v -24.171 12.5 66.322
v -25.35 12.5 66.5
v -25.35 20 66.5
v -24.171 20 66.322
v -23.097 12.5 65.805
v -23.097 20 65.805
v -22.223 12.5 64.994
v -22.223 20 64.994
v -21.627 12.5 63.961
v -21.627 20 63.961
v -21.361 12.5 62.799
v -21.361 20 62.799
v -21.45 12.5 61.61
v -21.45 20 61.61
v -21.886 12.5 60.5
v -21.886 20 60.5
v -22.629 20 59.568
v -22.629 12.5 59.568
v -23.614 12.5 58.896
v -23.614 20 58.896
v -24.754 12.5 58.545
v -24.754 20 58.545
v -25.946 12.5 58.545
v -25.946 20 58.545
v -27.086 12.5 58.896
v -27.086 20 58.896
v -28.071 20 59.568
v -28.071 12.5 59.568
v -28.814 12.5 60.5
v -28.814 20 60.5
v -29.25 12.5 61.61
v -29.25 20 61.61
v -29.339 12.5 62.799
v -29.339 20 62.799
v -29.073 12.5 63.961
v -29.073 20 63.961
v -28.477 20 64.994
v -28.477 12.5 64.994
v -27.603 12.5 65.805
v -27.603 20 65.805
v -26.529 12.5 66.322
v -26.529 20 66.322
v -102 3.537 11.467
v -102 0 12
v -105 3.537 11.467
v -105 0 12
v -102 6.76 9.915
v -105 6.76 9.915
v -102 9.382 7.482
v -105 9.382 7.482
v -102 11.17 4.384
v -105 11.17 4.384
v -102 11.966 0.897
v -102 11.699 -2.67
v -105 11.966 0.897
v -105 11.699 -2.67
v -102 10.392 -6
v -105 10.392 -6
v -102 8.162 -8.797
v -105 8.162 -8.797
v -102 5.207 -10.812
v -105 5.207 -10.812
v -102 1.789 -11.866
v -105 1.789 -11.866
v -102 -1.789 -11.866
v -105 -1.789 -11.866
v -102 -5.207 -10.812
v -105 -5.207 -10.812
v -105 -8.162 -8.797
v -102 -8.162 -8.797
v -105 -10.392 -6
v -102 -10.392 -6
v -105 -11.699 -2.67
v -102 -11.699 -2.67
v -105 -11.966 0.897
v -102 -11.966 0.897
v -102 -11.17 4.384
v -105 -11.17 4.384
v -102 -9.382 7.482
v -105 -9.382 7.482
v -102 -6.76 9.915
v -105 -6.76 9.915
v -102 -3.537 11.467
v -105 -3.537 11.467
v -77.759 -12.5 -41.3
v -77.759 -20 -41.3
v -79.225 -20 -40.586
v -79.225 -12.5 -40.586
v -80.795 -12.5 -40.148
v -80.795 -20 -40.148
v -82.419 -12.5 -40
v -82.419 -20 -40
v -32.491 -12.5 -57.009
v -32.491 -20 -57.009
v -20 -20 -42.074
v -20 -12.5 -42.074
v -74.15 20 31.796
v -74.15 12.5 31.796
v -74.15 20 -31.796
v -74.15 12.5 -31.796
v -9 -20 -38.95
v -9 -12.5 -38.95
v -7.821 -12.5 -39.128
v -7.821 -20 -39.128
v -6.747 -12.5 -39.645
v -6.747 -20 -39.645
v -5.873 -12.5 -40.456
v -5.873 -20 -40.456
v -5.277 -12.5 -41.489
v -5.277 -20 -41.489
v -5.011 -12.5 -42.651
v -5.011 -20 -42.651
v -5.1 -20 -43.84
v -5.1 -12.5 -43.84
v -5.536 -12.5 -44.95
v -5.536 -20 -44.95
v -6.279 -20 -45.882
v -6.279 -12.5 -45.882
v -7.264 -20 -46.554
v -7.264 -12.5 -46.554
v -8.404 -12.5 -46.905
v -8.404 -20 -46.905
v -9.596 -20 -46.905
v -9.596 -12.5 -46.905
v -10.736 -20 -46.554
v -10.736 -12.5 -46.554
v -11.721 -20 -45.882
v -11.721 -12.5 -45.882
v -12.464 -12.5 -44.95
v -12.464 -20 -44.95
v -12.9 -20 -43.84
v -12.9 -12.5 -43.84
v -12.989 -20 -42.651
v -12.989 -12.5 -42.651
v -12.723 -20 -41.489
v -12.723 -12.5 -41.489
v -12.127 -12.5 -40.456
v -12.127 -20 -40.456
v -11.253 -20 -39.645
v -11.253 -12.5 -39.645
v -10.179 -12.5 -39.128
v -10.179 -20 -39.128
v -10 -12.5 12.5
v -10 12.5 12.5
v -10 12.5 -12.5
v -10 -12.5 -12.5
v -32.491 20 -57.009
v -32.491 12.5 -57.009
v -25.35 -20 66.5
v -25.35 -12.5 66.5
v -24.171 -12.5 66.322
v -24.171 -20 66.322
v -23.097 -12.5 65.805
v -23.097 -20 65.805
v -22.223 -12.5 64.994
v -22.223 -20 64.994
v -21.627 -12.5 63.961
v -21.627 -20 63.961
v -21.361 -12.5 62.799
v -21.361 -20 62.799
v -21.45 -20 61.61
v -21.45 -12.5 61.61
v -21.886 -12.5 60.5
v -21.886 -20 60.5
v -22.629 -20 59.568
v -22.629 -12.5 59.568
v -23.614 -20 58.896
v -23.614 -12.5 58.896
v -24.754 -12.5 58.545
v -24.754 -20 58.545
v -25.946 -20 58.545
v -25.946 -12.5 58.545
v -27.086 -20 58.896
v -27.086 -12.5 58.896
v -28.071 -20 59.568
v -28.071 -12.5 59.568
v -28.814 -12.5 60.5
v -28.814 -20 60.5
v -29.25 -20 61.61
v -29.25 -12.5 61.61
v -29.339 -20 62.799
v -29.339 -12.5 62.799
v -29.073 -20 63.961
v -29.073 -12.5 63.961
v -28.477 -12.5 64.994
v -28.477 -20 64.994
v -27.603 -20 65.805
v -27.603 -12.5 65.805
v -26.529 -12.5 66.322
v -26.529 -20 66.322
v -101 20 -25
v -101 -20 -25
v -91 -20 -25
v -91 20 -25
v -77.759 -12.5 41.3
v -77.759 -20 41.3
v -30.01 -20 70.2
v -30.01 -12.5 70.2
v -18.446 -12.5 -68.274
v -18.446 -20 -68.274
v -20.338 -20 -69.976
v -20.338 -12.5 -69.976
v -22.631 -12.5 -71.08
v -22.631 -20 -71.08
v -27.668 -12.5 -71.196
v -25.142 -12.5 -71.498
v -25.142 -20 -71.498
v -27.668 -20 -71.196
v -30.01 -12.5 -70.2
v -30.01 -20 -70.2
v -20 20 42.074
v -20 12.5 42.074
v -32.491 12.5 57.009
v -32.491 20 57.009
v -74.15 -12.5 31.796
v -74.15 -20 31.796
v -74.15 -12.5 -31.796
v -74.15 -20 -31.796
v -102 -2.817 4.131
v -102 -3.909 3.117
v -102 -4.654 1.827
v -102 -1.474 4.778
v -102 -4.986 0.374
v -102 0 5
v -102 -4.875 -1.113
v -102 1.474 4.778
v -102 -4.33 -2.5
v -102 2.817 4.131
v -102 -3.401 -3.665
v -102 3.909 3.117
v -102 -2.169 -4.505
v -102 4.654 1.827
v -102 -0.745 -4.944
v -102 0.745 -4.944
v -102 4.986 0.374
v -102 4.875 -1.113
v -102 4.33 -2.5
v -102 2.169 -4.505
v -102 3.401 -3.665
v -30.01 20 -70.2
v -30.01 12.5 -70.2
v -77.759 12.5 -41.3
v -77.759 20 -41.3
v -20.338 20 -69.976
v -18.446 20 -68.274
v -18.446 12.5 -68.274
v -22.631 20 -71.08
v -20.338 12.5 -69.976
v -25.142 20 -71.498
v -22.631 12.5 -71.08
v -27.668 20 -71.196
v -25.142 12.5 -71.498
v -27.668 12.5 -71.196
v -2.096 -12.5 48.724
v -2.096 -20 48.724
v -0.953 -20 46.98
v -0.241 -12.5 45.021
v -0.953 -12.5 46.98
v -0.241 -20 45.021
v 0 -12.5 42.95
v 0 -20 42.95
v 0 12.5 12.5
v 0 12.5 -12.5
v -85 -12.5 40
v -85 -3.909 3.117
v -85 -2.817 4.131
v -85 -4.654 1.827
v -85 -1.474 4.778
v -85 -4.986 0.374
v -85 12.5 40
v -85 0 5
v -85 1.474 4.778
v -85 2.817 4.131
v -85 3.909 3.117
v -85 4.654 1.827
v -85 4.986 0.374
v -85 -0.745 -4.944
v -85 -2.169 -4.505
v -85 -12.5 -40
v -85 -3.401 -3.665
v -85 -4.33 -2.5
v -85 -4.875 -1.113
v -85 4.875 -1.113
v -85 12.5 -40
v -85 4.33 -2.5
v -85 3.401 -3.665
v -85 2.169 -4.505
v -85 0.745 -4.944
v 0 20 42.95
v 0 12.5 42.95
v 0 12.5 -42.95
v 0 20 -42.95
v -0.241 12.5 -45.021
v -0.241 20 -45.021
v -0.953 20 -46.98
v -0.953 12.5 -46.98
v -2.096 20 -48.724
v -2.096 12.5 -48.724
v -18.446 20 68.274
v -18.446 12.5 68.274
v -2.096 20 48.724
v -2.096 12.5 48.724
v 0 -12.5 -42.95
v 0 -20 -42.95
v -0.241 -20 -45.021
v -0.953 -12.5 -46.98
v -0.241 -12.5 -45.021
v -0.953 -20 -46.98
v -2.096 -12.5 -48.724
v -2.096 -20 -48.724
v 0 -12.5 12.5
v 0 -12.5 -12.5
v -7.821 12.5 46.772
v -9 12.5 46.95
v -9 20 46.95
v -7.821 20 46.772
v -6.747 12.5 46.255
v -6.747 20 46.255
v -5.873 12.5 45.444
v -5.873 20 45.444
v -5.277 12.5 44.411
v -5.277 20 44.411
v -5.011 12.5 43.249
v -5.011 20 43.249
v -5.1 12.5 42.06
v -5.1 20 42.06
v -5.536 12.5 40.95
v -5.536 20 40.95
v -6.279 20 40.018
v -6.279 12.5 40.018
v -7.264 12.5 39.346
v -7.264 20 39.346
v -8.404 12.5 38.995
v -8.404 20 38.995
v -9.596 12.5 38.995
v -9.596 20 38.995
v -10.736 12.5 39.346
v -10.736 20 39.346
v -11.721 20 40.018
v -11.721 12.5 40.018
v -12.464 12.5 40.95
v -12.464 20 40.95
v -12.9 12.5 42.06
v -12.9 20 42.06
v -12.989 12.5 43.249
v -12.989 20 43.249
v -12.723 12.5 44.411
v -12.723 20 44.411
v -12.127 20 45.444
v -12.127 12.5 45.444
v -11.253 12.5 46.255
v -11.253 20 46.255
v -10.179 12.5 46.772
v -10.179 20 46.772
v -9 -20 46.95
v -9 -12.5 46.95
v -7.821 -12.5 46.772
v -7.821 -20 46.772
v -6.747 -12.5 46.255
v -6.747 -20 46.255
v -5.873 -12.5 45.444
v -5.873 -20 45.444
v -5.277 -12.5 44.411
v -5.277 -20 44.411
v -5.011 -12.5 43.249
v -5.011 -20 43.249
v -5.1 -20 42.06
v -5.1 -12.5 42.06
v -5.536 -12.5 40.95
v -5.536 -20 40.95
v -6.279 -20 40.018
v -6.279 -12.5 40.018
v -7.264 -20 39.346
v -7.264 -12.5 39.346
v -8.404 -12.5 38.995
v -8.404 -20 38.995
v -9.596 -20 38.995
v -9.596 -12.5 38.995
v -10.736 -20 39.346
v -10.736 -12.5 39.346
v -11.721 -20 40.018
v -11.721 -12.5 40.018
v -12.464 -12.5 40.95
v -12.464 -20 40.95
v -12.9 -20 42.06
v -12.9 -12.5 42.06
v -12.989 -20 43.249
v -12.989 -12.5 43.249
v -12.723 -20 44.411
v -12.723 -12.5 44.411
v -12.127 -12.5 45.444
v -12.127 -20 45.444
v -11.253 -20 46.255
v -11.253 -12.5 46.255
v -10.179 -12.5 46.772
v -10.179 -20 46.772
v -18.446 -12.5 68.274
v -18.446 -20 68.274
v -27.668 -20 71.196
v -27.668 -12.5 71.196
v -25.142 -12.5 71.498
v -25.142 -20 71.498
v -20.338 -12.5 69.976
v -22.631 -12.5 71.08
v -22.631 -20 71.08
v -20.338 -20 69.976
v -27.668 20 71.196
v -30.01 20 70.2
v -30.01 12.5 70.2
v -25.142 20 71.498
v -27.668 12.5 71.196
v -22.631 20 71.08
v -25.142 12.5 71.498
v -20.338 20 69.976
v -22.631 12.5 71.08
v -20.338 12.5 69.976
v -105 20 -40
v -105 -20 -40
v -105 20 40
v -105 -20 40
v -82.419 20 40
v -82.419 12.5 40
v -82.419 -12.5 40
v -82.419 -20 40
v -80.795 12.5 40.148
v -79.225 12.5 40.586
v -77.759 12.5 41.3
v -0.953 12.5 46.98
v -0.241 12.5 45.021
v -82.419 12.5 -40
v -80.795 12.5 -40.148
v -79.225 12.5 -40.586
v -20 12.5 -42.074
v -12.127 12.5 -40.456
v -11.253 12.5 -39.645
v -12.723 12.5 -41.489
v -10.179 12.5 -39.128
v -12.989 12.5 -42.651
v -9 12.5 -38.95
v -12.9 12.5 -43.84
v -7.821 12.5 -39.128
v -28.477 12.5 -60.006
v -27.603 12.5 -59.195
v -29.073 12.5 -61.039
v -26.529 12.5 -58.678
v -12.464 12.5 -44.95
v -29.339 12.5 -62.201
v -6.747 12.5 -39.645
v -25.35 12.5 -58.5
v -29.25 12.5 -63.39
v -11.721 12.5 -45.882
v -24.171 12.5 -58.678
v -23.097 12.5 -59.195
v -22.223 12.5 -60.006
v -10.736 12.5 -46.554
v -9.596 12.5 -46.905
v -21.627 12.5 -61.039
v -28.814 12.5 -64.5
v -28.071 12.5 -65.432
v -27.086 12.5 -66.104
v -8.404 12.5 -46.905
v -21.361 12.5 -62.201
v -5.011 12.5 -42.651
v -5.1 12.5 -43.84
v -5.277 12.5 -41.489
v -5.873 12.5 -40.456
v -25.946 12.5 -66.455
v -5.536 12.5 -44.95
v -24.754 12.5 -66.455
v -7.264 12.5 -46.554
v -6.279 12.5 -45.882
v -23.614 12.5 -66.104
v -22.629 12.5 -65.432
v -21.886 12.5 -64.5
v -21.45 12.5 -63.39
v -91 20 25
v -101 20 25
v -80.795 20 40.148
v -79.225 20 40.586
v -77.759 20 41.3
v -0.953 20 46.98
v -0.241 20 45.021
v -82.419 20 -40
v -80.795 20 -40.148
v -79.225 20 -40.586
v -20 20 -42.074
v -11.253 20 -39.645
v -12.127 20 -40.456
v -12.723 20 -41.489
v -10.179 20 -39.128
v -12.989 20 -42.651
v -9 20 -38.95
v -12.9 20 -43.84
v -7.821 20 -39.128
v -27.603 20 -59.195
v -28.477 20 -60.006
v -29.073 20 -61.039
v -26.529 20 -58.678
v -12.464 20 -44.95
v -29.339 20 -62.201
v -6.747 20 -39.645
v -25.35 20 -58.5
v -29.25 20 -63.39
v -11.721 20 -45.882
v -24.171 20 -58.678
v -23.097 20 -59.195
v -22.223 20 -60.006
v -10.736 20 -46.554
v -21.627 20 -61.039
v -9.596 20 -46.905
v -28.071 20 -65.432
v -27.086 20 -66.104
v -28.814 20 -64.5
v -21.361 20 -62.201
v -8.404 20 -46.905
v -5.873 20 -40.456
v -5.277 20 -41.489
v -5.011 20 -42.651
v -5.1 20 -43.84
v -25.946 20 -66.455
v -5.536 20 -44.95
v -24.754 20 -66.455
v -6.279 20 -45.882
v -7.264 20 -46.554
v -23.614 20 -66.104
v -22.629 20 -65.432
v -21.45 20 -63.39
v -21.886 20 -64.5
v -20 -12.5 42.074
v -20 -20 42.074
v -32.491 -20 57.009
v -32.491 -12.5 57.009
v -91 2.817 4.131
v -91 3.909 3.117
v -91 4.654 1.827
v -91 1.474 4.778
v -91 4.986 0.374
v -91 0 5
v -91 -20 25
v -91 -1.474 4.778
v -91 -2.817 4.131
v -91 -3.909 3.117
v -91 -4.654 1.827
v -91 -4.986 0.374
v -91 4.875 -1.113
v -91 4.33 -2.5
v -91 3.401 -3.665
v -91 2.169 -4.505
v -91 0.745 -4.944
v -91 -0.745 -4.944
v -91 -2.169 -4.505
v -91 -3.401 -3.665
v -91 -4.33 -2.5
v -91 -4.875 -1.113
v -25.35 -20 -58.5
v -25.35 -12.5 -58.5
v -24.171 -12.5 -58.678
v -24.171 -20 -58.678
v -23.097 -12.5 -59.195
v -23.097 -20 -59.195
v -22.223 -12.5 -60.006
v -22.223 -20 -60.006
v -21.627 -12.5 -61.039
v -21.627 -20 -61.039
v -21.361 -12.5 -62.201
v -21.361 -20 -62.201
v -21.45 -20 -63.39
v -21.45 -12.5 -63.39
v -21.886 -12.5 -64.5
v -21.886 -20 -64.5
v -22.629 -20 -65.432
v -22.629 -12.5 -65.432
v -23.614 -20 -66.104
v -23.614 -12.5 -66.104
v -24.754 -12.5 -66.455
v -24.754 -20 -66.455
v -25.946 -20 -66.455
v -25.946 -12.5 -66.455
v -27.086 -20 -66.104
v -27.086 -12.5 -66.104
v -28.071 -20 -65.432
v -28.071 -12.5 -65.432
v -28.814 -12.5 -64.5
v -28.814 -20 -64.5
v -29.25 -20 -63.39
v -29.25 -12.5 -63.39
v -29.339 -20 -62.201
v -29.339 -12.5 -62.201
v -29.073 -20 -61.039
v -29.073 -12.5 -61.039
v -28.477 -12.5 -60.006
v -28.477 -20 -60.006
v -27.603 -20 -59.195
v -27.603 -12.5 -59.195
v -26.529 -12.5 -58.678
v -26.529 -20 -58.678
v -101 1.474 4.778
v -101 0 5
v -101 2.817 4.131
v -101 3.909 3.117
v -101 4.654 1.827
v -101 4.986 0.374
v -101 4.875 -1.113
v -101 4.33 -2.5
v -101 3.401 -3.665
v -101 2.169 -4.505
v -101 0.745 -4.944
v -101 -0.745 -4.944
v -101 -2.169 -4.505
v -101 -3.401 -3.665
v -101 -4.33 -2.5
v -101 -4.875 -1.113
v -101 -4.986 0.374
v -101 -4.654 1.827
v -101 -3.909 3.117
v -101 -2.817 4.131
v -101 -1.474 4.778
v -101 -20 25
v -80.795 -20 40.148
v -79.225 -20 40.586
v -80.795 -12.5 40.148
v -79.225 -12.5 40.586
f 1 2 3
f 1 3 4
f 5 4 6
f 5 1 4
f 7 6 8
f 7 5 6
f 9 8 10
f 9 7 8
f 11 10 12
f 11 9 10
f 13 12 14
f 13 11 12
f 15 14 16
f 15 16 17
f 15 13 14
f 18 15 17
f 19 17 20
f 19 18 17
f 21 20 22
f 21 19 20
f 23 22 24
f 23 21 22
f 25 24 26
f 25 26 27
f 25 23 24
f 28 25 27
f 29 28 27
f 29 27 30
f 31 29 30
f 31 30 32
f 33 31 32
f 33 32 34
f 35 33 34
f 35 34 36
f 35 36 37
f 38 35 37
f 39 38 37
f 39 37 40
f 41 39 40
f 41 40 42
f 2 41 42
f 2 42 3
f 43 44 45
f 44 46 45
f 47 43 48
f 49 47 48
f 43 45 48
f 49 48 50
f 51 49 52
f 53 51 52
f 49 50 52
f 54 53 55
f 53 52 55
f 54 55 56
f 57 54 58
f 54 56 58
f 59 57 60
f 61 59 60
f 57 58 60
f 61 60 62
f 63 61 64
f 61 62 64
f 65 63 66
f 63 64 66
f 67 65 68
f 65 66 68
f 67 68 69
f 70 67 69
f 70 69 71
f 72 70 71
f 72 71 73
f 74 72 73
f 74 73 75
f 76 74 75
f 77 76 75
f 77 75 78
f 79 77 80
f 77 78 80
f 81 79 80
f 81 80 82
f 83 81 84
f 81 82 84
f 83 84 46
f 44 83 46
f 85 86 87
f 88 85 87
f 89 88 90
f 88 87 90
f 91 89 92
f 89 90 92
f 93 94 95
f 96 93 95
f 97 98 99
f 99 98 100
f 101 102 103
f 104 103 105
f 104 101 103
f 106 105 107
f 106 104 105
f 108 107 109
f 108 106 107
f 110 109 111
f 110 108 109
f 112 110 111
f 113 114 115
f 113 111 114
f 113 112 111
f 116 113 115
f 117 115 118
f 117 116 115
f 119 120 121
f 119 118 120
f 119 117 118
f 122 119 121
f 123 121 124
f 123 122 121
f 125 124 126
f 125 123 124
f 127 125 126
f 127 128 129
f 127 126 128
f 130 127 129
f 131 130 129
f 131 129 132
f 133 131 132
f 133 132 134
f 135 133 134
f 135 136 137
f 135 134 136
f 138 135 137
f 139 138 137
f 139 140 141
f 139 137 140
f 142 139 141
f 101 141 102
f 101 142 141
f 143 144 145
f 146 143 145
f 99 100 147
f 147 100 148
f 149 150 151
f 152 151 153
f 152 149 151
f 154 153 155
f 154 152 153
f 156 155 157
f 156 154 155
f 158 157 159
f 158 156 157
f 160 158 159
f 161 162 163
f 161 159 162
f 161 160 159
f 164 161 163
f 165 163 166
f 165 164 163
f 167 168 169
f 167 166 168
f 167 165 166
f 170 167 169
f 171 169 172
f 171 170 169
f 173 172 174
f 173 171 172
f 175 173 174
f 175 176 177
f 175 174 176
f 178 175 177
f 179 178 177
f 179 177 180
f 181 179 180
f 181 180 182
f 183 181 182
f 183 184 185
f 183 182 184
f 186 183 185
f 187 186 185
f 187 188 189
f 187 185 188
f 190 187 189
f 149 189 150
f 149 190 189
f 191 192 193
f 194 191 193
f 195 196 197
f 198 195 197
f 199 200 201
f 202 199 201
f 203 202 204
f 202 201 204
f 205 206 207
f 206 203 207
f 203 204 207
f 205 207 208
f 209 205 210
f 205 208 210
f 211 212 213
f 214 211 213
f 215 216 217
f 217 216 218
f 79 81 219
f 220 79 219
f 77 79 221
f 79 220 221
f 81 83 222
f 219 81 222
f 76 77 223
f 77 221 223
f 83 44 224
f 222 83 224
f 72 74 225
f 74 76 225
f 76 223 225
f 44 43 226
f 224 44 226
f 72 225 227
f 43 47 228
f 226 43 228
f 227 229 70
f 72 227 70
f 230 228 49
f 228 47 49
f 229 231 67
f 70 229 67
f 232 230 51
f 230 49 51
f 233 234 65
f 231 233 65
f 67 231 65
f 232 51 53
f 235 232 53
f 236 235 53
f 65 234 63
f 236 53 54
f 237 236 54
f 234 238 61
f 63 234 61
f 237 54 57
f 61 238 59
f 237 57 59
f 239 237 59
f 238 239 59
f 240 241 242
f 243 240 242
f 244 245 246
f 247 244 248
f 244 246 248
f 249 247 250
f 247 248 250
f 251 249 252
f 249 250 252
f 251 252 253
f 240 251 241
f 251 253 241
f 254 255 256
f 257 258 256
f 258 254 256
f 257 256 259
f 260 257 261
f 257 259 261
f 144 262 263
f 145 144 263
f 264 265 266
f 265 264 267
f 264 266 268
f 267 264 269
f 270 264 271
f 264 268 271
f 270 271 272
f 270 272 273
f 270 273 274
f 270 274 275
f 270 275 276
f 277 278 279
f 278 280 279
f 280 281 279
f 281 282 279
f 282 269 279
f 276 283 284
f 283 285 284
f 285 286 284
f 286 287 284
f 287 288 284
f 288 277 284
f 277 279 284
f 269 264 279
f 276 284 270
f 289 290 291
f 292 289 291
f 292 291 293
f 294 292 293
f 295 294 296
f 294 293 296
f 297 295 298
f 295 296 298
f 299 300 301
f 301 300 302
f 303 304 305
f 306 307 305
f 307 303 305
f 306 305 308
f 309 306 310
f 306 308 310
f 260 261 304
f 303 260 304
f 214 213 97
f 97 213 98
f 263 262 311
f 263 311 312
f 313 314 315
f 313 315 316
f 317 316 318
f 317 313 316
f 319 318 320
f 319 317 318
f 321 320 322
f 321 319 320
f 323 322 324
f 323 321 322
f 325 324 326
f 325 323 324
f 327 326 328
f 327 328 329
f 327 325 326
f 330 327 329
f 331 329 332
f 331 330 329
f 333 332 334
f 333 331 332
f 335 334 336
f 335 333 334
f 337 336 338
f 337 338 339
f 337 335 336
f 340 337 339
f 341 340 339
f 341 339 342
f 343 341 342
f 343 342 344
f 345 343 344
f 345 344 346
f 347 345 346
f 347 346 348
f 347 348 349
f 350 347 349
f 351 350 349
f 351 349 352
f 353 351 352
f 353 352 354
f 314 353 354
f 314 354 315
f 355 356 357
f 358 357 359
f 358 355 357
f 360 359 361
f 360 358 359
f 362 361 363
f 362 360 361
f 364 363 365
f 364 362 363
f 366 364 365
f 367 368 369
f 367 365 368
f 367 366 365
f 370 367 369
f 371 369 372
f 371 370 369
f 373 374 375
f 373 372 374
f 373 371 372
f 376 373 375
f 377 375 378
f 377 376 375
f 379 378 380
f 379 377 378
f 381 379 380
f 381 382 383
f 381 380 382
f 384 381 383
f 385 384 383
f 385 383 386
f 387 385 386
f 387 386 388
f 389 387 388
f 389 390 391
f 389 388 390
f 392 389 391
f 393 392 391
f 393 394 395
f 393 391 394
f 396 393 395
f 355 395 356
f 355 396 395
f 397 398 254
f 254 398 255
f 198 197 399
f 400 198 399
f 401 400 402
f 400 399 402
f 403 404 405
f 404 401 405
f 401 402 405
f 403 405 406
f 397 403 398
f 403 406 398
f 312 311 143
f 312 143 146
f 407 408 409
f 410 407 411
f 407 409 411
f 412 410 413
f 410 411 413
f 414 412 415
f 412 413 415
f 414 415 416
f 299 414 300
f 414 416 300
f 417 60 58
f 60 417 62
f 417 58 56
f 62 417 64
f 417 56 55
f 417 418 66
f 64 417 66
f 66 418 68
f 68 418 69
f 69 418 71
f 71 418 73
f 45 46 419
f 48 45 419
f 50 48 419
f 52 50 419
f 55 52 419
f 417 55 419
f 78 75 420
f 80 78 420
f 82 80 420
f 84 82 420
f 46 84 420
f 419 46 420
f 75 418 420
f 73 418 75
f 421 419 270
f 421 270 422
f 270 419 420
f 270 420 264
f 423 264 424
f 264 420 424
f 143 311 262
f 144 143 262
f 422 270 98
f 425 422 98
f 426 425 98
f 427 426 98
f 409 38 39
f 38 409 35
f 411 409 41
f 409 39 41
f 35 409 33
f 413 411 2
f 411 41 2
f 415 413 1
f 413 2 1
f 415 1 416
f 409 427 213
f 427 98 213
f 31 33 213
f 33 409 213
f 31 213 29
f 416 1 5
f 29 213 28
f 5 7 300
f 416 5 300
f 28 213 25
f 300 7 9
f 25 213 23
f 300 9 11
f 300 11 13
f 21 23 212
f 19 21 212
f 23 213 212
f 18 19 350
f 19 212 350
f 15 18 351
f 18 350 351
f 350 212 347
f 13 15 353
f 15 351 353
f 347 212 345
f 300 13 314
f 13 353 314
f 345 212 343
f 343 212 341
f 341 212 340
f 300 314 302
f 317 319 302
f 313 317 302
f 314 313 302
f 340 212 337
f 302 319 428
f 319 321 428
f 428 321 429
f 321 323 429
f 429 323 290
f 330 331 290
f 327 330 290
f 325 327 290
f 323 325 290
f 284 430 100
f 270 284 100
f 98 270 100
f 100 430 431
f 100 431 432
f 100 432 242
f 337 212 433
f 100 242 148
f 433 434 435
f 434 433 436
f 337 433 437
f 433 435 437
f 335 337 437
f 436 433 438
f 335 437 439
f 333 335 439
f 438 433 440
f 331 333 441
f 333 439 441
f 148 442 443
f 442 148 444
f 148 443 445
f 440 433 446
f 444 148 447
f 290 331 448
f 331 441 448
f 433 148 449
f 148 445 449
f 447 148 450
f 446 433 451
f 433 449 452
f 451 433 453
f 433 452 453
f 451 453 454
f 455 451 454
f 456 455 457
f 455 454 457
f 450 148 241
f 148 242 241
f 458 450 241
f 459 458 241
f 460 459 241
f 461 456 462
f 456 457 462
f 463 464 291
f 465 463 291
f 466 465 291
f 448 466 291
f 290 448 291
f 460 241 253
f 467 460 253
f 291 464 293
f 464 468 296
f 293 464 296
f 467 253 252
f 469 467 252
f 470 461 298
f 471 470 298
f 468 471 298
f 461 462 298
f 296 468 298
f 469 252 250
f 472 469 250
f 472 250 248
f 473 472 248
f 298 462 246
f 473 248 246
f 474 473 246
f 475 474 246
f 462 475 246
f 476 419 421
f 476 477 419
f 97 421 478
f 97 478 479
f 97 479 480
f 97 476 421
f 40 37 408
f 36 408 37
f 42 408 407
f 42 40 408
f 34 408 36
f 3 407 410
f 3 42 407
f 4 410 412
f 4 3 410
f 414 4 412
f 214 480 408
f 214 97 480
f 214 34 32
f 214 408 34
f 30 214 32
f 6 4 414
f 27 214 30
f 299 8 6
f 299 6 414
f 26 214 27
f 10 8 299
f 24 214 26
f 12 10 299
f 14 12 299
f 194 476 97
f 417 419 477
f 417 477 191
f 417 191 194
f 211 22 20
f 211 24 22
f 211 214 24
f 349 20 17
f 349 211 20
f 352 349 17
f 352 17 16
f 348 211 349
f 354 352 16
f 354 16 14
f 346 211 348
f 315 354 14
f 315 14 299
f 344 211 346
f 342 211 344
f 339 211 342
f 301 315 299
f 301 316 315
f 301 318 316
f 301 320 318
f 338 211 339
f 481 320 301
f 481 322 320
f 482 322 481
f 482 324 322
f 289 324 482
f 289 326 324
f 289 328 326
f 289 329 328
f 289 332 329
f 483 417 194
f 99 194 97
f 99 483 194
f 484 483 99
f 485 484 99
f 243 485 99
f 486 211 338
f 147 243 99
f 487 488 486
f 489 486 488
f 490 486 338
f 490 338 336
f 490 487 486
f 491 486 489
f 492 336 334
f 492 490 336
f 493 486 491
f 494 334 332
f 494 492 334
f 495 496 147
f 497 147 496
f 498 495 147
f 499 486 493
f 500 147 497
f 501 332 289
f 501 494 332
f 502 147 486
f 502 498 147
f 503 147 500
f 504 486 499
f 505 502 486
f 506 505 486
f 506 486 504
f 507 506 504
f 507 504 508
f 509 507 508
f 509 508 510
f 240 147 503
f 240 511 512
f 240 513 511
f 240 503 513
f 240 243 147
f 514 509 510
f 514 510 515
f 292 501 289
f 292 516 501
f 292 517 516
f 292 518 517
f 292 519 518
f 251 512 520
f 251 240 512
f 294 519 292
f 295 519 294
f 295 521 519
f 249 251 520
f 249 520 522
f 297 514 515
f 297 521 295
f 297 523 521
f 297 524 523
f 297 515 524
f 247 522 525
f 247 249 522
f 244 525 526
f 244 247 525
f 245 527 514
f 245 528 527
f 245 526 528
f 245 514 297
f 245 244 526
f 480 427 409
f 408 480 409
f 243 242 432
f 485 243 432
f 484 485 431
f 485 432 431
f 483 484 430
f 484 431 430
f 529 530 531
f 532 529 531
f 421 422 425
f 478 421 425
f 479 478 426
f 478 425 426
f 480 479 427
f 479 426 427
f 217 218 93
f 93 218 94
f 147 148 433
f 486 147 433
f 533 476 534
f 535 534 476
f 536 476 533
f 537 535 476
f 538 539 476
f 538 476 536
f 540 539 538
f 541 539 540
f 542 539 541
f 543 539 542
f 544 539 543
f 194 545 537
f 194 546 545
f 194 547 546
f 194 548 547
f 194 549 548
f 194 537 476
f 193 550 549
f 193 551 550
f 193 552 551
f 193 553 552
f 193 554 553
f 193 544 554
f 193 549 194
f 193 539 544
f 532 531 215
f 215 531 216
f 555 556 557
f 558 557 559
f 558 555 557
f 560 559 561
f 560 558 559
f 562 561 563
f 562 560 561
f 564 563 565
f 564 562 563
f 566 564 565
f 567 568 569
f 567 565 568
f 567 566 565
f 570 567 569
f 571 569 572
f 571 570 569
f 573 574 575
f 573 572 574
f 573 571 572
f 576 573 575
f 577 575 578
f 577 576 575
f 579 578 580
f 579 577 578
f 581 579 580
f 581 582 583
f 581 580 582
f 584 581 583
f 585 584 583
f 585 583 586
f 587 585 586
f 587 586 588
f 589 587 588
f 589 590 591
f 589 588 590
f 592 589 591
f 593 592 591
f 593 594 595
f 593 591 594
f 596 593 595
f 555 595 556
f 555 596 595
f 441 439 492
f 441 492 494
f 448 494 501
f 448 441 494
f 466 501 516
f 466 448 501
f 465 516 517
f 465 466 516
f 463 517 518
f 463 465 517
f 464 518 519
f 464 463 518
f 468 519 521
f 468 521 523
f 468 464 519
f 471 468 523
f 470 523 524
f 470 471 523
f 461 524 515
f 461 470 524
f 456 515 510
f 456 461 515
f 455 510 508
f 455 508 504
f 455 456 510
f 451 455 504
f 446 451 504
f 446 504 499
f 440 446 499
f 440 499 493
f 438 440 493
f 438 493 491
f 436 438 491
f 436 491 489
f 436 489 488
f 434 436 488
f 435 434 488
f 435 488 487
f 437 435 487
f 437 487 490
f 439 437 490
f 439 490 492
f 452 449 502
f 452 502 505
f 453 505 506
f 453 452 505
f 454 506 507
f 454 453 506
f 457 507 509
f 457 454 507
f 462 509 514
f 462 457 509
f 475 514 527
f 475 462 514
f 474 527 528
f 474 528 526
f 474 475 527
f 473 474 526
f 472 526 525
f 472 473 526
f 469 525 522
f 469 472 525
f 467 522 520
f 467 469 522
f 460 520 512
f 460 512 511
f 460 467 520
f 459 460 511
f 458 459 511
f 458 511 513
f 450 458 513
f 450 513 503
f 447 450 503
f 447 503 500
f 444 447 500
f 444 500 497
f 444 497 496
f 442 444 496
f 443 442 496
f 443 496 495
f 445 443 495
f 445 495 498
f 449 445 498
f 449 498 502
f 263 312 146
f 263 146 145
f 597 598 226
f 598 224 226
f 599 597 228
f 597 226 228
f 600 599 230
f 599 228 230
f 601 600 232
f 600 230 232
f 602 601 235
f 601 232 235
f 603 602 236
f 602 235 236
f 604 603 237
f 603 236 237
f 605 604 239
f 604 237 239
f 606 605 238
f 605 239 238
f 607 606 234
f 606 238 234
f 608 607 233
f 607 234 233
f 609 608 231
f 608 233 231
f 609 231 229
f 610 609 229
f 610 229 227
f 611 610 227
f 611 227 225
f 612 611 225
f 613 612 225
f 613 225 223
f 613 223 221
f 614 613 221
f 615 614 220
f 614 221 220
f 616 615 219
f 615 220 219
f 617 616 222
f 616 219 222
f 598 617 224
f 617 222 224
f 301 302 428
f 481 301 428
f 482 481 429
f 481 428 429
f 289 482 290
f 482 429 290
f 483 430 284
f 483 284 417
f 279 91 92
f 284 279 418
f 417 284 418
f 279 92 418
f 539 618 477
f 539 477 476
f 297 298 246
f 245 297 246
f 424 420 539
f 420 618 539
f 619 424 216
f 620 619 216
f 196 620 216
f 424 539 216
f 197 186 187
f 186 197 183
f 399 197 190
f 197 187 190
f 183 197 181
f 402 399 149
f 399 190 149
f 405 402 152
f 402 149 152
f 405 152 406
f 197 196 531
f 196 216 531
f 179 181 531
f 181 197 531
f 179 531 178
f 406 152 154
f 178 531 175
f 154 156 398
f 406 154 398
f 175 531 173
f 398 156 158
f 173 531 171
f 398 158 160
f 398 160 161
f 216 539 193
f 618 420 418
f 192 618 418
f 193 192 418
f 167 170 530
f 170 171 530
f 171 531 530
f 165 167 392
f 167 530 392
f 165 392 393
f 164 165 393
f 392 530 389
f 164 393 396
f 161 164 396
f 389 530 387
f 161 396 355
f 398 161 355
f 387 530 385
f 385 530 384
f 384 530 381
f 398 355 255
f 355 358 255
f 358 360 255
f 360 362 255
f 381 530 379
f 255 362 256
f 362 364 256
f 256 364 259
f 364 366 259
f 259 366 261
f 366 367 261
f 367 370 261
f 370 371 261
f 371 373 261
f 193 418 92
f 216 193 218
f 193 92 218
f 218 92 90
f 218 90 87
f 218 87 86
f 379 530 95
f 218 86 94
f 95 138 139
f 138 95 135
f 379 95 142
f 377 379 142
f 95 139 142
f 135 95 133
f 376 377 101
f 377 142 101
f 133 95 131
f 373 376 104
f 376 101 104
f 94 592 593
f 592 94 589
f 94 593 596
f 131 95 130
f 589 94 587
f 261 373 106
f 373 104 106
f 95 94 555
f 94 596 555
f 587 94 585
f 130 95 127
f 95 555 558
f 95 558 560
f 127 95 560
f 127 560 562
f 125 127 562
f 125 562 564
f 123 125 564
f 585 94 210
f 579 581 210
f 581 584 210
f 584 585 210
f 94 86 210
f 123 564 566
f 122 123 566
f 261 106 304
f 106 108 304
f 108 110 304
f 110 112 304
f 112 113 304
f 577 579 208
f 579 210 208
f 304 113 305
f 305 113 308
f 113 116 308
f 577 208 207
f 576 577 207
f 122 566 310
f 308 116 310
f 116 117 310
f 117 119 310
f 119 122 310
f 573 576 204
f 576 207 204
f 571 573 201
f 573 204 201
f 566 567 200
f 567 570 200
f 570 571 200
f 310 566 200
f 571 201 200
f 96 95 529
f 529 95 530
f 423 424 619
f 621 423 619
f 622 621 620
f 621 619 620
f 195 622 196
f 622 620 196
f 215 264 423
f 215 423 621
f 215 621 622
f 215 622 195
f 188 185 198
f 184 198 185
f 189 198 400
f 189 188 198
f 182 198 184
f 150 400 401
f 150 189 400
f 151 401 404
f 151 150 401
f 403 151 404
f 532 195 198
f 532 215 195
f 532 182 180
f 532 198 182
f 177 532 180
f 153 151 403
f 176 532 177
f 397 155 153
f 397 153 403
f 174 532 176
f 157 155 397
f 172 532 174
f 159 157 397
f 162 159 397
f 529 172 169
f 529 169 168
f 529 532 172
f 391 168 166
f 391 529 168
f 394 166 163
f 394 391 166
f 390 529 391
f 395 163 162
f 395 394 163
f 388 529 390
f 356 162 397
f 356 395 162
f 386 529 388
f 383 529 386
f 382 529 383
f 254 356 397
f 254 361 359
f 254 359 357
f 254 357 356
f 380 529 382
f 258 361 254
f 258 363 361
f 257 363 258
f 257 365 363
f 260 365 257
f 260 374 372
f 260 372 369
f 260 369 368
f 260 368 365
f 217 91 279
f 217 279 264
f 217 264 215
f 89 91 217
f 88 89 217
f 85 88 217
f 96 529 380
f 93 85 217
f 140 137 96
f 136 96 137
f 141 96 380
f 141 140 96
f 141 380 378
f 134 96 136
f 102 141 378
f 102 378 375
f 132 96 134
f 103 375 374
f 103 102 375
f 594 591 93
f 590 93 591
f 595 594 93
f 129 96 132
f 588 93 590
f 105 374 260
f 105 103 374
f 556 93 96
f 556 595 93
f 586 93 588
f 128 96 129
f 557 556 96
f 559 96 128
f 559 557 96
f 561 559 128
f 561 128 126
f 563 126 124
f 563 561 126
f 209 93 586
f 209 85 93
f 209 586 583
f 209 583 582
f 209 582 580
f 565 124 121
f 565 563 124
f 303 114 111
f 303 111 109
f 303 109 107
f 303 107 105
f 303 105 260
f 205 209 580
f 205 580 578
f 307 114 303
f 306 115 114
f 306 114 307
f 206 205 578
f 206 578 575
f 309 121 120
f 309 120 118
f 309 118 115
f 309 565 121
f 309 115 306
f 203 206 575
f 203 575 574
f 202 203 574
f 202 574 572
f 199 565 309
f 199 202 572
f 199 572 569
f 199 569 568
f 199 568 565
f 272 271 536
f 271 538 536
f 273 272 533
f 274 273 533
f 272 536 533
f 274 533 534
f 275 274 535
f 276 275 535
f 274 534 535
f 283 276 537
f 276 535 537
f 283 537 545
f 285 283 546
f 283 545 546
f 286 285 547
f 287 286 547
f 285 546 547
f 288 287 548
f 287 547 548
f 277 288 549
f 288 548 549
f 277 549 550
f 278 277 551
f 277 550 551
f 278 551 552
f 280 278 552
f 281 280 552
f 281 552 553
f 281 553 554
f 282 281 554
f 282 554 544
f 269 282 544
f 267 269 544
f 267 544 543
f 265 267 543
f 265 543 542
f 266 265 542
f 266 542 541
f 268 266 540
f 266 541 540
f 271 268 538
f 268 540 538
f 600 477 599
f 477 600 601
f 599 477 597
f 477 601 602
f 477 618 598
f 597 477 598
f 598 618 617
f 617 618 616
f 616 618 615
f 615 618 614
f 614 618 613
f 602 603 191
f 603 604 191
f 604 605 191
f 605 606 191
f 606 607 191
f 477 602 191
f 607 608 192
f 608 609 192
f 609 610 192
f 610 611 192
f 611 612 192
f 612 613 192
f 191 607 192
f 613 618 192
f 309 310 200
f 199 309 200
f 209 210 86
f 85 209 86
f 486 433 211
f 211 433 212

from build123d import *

# Parameters (mm, degrees)
BOSS_EXTRUDE1_DEPTH      = 20
BOSS_EXTRUDE1_DEPTH_BACK = 20
SKETCH2_R                = 4
SKETCH2_W                = 10
SKETCH2_H                = 50
CUT_EXTRUDE1_DEPTH       = 129.597239473
CUT_EXTRUDE1_DEPTH_BACK  = 129.597239473
SKETCH3_W                = 85
SKETCH3_H                = 25
SKETCH4_W                = 25
SKETCH4_H                = 25
BOSS_EXTRUDE2_DEPTH      = 10


with BuildPart() as part:
    # Sketch2 → Boss-Extrude1 (new, two sides: drawn at the far end of the back side and taken through both)
    with BuildSketch(Plane(origin=(0, 0, 0), x_dir=(1, 0, 0), z_dir=(0, 1, 0)).offset(-BOSS_EXTRUDE1_DEPTH_BACK)):
        with BuildLine():
            Line((0, -42.95), (0, 42.95))
            ThreePointArc((0, 42.95), (-0.540252712, 46.02126616), (-2.096150183, 48.723807903))
            Line((-2.096150183, 48.723807903), (-18.446150183, 68.273807903))
            ThreePointArc((-18.446150183, 68.273807903), (-23.87154407, 71.377734399), (-30.010051253, 70.199605335))
            Line((-30.010051253, 70.199605335), (-77.758993185, 41.300394665))
            ThreePointArc((-77.758993185, 41.300394665), (-80, 40.331192469), (-82.419044438, 40))
            Line((-82.419044438, 40), (-105, 40))
            Line((-105, 40), (-105, -40))
            Line((-105, -40), (-82.419044438, -40))
            ThreePointArc((-82.419044438, -40), (-80, -40.331192469), (-77.758993185, -41.300394665))
            Line((-77.758993185, -41.300394665), (-30.010051253, -70.199605335))
            ThreePointArc((-30.010051253, -70.199605335), (-23.87154407, -71.377734399), (-18.446150183, -68.273807903))
            Line((-18.446150183, -68.273807903), (-2.096150183, -48.723807903))
            ThreePointArc((-2.096150183, -48.723807903), (-0.540252712, -46.02126616), (0, -42.95))
        make_face()
        with Locations((-25.35, 62.5)):
            Circle(SKETCH2_R, mode=Mode.SUBTRACT)
        with Locations((-9, 42.95)):
            Circle(SKETCH2_R, mode=Mode.SUBTRACT)
        with Locations((-9, -42.95)):
            Circle(SKETCH2_R, mode=Mode.SUBTRACT)
        with Locations((-25.35, -62.5)):
            Circle(SKETCH2_R, mode=Mode.SUBTRACT)
        Polygon((-74.15, -31.795763765), (-74.15, 31.795763765), (-32.490659495, 57.009349846), (-20, 42.074035282), (-20, -42.074035282), (-32.490659495, -57.009349846), align=None, mode=Mode.SUBTRACT)
        with Locations((-96, 0)):
            Rectangle(SKETCH2_W, SKETCH2_H, mode=Mode.SUBTRACT)
    extrude(amount=BOSS_EXTRUDE1_DEPTH + BOSS_EXTRUDE1_DEPTH_BACK)

    # Sketch3 → Cut-Extrude1 (cut, two sides: drawn at the far end of the back side and taken through both)
    with BuildSketch(Plane.XY.offset(-CUT_EXTRUDE1_DEPTH_BACK)):
        with Locations((-42.5, 0)):
            Rectangle(SKETCH3_W, SKETCH3_H)
    extrude(amount=CUT_EXTRUDE1_DEPTH + CUT_EXTRUDE1_DEPTH_BACK, mode=Mode.SUBTRACT)

    # Sketch6 → Hole1 (revolve, cut)
    with BuildSketch(Plane(origin=(-105, 0, 0), x_dir=(0, 0, 1), z_dir=(0, 1, 0))):
        Polygon((0, 0), (0, 30), (5, 30), (5, 3), (12, 3), (12, 0), align=None)
    revolve(axis=Axis((5, 0, 0), (-1, 0, 0)), mode=Mode.SUBTRACT)


with BuildPart() as body_2:
    # Sketch4 → Boss-Extrude2 (new body)
    with BuildSketch(Plane(origin=(0, 0, 0), x_dir=(0, 0, -1), z_dir=(1, 0, 0))):
        Rectangle(SKETCH4_W, SKETCH4_H)
    extrude(amount=-BOSS_EXTRUDE2_DEPTH)


solid = Compound([part.part, body_2.part])
